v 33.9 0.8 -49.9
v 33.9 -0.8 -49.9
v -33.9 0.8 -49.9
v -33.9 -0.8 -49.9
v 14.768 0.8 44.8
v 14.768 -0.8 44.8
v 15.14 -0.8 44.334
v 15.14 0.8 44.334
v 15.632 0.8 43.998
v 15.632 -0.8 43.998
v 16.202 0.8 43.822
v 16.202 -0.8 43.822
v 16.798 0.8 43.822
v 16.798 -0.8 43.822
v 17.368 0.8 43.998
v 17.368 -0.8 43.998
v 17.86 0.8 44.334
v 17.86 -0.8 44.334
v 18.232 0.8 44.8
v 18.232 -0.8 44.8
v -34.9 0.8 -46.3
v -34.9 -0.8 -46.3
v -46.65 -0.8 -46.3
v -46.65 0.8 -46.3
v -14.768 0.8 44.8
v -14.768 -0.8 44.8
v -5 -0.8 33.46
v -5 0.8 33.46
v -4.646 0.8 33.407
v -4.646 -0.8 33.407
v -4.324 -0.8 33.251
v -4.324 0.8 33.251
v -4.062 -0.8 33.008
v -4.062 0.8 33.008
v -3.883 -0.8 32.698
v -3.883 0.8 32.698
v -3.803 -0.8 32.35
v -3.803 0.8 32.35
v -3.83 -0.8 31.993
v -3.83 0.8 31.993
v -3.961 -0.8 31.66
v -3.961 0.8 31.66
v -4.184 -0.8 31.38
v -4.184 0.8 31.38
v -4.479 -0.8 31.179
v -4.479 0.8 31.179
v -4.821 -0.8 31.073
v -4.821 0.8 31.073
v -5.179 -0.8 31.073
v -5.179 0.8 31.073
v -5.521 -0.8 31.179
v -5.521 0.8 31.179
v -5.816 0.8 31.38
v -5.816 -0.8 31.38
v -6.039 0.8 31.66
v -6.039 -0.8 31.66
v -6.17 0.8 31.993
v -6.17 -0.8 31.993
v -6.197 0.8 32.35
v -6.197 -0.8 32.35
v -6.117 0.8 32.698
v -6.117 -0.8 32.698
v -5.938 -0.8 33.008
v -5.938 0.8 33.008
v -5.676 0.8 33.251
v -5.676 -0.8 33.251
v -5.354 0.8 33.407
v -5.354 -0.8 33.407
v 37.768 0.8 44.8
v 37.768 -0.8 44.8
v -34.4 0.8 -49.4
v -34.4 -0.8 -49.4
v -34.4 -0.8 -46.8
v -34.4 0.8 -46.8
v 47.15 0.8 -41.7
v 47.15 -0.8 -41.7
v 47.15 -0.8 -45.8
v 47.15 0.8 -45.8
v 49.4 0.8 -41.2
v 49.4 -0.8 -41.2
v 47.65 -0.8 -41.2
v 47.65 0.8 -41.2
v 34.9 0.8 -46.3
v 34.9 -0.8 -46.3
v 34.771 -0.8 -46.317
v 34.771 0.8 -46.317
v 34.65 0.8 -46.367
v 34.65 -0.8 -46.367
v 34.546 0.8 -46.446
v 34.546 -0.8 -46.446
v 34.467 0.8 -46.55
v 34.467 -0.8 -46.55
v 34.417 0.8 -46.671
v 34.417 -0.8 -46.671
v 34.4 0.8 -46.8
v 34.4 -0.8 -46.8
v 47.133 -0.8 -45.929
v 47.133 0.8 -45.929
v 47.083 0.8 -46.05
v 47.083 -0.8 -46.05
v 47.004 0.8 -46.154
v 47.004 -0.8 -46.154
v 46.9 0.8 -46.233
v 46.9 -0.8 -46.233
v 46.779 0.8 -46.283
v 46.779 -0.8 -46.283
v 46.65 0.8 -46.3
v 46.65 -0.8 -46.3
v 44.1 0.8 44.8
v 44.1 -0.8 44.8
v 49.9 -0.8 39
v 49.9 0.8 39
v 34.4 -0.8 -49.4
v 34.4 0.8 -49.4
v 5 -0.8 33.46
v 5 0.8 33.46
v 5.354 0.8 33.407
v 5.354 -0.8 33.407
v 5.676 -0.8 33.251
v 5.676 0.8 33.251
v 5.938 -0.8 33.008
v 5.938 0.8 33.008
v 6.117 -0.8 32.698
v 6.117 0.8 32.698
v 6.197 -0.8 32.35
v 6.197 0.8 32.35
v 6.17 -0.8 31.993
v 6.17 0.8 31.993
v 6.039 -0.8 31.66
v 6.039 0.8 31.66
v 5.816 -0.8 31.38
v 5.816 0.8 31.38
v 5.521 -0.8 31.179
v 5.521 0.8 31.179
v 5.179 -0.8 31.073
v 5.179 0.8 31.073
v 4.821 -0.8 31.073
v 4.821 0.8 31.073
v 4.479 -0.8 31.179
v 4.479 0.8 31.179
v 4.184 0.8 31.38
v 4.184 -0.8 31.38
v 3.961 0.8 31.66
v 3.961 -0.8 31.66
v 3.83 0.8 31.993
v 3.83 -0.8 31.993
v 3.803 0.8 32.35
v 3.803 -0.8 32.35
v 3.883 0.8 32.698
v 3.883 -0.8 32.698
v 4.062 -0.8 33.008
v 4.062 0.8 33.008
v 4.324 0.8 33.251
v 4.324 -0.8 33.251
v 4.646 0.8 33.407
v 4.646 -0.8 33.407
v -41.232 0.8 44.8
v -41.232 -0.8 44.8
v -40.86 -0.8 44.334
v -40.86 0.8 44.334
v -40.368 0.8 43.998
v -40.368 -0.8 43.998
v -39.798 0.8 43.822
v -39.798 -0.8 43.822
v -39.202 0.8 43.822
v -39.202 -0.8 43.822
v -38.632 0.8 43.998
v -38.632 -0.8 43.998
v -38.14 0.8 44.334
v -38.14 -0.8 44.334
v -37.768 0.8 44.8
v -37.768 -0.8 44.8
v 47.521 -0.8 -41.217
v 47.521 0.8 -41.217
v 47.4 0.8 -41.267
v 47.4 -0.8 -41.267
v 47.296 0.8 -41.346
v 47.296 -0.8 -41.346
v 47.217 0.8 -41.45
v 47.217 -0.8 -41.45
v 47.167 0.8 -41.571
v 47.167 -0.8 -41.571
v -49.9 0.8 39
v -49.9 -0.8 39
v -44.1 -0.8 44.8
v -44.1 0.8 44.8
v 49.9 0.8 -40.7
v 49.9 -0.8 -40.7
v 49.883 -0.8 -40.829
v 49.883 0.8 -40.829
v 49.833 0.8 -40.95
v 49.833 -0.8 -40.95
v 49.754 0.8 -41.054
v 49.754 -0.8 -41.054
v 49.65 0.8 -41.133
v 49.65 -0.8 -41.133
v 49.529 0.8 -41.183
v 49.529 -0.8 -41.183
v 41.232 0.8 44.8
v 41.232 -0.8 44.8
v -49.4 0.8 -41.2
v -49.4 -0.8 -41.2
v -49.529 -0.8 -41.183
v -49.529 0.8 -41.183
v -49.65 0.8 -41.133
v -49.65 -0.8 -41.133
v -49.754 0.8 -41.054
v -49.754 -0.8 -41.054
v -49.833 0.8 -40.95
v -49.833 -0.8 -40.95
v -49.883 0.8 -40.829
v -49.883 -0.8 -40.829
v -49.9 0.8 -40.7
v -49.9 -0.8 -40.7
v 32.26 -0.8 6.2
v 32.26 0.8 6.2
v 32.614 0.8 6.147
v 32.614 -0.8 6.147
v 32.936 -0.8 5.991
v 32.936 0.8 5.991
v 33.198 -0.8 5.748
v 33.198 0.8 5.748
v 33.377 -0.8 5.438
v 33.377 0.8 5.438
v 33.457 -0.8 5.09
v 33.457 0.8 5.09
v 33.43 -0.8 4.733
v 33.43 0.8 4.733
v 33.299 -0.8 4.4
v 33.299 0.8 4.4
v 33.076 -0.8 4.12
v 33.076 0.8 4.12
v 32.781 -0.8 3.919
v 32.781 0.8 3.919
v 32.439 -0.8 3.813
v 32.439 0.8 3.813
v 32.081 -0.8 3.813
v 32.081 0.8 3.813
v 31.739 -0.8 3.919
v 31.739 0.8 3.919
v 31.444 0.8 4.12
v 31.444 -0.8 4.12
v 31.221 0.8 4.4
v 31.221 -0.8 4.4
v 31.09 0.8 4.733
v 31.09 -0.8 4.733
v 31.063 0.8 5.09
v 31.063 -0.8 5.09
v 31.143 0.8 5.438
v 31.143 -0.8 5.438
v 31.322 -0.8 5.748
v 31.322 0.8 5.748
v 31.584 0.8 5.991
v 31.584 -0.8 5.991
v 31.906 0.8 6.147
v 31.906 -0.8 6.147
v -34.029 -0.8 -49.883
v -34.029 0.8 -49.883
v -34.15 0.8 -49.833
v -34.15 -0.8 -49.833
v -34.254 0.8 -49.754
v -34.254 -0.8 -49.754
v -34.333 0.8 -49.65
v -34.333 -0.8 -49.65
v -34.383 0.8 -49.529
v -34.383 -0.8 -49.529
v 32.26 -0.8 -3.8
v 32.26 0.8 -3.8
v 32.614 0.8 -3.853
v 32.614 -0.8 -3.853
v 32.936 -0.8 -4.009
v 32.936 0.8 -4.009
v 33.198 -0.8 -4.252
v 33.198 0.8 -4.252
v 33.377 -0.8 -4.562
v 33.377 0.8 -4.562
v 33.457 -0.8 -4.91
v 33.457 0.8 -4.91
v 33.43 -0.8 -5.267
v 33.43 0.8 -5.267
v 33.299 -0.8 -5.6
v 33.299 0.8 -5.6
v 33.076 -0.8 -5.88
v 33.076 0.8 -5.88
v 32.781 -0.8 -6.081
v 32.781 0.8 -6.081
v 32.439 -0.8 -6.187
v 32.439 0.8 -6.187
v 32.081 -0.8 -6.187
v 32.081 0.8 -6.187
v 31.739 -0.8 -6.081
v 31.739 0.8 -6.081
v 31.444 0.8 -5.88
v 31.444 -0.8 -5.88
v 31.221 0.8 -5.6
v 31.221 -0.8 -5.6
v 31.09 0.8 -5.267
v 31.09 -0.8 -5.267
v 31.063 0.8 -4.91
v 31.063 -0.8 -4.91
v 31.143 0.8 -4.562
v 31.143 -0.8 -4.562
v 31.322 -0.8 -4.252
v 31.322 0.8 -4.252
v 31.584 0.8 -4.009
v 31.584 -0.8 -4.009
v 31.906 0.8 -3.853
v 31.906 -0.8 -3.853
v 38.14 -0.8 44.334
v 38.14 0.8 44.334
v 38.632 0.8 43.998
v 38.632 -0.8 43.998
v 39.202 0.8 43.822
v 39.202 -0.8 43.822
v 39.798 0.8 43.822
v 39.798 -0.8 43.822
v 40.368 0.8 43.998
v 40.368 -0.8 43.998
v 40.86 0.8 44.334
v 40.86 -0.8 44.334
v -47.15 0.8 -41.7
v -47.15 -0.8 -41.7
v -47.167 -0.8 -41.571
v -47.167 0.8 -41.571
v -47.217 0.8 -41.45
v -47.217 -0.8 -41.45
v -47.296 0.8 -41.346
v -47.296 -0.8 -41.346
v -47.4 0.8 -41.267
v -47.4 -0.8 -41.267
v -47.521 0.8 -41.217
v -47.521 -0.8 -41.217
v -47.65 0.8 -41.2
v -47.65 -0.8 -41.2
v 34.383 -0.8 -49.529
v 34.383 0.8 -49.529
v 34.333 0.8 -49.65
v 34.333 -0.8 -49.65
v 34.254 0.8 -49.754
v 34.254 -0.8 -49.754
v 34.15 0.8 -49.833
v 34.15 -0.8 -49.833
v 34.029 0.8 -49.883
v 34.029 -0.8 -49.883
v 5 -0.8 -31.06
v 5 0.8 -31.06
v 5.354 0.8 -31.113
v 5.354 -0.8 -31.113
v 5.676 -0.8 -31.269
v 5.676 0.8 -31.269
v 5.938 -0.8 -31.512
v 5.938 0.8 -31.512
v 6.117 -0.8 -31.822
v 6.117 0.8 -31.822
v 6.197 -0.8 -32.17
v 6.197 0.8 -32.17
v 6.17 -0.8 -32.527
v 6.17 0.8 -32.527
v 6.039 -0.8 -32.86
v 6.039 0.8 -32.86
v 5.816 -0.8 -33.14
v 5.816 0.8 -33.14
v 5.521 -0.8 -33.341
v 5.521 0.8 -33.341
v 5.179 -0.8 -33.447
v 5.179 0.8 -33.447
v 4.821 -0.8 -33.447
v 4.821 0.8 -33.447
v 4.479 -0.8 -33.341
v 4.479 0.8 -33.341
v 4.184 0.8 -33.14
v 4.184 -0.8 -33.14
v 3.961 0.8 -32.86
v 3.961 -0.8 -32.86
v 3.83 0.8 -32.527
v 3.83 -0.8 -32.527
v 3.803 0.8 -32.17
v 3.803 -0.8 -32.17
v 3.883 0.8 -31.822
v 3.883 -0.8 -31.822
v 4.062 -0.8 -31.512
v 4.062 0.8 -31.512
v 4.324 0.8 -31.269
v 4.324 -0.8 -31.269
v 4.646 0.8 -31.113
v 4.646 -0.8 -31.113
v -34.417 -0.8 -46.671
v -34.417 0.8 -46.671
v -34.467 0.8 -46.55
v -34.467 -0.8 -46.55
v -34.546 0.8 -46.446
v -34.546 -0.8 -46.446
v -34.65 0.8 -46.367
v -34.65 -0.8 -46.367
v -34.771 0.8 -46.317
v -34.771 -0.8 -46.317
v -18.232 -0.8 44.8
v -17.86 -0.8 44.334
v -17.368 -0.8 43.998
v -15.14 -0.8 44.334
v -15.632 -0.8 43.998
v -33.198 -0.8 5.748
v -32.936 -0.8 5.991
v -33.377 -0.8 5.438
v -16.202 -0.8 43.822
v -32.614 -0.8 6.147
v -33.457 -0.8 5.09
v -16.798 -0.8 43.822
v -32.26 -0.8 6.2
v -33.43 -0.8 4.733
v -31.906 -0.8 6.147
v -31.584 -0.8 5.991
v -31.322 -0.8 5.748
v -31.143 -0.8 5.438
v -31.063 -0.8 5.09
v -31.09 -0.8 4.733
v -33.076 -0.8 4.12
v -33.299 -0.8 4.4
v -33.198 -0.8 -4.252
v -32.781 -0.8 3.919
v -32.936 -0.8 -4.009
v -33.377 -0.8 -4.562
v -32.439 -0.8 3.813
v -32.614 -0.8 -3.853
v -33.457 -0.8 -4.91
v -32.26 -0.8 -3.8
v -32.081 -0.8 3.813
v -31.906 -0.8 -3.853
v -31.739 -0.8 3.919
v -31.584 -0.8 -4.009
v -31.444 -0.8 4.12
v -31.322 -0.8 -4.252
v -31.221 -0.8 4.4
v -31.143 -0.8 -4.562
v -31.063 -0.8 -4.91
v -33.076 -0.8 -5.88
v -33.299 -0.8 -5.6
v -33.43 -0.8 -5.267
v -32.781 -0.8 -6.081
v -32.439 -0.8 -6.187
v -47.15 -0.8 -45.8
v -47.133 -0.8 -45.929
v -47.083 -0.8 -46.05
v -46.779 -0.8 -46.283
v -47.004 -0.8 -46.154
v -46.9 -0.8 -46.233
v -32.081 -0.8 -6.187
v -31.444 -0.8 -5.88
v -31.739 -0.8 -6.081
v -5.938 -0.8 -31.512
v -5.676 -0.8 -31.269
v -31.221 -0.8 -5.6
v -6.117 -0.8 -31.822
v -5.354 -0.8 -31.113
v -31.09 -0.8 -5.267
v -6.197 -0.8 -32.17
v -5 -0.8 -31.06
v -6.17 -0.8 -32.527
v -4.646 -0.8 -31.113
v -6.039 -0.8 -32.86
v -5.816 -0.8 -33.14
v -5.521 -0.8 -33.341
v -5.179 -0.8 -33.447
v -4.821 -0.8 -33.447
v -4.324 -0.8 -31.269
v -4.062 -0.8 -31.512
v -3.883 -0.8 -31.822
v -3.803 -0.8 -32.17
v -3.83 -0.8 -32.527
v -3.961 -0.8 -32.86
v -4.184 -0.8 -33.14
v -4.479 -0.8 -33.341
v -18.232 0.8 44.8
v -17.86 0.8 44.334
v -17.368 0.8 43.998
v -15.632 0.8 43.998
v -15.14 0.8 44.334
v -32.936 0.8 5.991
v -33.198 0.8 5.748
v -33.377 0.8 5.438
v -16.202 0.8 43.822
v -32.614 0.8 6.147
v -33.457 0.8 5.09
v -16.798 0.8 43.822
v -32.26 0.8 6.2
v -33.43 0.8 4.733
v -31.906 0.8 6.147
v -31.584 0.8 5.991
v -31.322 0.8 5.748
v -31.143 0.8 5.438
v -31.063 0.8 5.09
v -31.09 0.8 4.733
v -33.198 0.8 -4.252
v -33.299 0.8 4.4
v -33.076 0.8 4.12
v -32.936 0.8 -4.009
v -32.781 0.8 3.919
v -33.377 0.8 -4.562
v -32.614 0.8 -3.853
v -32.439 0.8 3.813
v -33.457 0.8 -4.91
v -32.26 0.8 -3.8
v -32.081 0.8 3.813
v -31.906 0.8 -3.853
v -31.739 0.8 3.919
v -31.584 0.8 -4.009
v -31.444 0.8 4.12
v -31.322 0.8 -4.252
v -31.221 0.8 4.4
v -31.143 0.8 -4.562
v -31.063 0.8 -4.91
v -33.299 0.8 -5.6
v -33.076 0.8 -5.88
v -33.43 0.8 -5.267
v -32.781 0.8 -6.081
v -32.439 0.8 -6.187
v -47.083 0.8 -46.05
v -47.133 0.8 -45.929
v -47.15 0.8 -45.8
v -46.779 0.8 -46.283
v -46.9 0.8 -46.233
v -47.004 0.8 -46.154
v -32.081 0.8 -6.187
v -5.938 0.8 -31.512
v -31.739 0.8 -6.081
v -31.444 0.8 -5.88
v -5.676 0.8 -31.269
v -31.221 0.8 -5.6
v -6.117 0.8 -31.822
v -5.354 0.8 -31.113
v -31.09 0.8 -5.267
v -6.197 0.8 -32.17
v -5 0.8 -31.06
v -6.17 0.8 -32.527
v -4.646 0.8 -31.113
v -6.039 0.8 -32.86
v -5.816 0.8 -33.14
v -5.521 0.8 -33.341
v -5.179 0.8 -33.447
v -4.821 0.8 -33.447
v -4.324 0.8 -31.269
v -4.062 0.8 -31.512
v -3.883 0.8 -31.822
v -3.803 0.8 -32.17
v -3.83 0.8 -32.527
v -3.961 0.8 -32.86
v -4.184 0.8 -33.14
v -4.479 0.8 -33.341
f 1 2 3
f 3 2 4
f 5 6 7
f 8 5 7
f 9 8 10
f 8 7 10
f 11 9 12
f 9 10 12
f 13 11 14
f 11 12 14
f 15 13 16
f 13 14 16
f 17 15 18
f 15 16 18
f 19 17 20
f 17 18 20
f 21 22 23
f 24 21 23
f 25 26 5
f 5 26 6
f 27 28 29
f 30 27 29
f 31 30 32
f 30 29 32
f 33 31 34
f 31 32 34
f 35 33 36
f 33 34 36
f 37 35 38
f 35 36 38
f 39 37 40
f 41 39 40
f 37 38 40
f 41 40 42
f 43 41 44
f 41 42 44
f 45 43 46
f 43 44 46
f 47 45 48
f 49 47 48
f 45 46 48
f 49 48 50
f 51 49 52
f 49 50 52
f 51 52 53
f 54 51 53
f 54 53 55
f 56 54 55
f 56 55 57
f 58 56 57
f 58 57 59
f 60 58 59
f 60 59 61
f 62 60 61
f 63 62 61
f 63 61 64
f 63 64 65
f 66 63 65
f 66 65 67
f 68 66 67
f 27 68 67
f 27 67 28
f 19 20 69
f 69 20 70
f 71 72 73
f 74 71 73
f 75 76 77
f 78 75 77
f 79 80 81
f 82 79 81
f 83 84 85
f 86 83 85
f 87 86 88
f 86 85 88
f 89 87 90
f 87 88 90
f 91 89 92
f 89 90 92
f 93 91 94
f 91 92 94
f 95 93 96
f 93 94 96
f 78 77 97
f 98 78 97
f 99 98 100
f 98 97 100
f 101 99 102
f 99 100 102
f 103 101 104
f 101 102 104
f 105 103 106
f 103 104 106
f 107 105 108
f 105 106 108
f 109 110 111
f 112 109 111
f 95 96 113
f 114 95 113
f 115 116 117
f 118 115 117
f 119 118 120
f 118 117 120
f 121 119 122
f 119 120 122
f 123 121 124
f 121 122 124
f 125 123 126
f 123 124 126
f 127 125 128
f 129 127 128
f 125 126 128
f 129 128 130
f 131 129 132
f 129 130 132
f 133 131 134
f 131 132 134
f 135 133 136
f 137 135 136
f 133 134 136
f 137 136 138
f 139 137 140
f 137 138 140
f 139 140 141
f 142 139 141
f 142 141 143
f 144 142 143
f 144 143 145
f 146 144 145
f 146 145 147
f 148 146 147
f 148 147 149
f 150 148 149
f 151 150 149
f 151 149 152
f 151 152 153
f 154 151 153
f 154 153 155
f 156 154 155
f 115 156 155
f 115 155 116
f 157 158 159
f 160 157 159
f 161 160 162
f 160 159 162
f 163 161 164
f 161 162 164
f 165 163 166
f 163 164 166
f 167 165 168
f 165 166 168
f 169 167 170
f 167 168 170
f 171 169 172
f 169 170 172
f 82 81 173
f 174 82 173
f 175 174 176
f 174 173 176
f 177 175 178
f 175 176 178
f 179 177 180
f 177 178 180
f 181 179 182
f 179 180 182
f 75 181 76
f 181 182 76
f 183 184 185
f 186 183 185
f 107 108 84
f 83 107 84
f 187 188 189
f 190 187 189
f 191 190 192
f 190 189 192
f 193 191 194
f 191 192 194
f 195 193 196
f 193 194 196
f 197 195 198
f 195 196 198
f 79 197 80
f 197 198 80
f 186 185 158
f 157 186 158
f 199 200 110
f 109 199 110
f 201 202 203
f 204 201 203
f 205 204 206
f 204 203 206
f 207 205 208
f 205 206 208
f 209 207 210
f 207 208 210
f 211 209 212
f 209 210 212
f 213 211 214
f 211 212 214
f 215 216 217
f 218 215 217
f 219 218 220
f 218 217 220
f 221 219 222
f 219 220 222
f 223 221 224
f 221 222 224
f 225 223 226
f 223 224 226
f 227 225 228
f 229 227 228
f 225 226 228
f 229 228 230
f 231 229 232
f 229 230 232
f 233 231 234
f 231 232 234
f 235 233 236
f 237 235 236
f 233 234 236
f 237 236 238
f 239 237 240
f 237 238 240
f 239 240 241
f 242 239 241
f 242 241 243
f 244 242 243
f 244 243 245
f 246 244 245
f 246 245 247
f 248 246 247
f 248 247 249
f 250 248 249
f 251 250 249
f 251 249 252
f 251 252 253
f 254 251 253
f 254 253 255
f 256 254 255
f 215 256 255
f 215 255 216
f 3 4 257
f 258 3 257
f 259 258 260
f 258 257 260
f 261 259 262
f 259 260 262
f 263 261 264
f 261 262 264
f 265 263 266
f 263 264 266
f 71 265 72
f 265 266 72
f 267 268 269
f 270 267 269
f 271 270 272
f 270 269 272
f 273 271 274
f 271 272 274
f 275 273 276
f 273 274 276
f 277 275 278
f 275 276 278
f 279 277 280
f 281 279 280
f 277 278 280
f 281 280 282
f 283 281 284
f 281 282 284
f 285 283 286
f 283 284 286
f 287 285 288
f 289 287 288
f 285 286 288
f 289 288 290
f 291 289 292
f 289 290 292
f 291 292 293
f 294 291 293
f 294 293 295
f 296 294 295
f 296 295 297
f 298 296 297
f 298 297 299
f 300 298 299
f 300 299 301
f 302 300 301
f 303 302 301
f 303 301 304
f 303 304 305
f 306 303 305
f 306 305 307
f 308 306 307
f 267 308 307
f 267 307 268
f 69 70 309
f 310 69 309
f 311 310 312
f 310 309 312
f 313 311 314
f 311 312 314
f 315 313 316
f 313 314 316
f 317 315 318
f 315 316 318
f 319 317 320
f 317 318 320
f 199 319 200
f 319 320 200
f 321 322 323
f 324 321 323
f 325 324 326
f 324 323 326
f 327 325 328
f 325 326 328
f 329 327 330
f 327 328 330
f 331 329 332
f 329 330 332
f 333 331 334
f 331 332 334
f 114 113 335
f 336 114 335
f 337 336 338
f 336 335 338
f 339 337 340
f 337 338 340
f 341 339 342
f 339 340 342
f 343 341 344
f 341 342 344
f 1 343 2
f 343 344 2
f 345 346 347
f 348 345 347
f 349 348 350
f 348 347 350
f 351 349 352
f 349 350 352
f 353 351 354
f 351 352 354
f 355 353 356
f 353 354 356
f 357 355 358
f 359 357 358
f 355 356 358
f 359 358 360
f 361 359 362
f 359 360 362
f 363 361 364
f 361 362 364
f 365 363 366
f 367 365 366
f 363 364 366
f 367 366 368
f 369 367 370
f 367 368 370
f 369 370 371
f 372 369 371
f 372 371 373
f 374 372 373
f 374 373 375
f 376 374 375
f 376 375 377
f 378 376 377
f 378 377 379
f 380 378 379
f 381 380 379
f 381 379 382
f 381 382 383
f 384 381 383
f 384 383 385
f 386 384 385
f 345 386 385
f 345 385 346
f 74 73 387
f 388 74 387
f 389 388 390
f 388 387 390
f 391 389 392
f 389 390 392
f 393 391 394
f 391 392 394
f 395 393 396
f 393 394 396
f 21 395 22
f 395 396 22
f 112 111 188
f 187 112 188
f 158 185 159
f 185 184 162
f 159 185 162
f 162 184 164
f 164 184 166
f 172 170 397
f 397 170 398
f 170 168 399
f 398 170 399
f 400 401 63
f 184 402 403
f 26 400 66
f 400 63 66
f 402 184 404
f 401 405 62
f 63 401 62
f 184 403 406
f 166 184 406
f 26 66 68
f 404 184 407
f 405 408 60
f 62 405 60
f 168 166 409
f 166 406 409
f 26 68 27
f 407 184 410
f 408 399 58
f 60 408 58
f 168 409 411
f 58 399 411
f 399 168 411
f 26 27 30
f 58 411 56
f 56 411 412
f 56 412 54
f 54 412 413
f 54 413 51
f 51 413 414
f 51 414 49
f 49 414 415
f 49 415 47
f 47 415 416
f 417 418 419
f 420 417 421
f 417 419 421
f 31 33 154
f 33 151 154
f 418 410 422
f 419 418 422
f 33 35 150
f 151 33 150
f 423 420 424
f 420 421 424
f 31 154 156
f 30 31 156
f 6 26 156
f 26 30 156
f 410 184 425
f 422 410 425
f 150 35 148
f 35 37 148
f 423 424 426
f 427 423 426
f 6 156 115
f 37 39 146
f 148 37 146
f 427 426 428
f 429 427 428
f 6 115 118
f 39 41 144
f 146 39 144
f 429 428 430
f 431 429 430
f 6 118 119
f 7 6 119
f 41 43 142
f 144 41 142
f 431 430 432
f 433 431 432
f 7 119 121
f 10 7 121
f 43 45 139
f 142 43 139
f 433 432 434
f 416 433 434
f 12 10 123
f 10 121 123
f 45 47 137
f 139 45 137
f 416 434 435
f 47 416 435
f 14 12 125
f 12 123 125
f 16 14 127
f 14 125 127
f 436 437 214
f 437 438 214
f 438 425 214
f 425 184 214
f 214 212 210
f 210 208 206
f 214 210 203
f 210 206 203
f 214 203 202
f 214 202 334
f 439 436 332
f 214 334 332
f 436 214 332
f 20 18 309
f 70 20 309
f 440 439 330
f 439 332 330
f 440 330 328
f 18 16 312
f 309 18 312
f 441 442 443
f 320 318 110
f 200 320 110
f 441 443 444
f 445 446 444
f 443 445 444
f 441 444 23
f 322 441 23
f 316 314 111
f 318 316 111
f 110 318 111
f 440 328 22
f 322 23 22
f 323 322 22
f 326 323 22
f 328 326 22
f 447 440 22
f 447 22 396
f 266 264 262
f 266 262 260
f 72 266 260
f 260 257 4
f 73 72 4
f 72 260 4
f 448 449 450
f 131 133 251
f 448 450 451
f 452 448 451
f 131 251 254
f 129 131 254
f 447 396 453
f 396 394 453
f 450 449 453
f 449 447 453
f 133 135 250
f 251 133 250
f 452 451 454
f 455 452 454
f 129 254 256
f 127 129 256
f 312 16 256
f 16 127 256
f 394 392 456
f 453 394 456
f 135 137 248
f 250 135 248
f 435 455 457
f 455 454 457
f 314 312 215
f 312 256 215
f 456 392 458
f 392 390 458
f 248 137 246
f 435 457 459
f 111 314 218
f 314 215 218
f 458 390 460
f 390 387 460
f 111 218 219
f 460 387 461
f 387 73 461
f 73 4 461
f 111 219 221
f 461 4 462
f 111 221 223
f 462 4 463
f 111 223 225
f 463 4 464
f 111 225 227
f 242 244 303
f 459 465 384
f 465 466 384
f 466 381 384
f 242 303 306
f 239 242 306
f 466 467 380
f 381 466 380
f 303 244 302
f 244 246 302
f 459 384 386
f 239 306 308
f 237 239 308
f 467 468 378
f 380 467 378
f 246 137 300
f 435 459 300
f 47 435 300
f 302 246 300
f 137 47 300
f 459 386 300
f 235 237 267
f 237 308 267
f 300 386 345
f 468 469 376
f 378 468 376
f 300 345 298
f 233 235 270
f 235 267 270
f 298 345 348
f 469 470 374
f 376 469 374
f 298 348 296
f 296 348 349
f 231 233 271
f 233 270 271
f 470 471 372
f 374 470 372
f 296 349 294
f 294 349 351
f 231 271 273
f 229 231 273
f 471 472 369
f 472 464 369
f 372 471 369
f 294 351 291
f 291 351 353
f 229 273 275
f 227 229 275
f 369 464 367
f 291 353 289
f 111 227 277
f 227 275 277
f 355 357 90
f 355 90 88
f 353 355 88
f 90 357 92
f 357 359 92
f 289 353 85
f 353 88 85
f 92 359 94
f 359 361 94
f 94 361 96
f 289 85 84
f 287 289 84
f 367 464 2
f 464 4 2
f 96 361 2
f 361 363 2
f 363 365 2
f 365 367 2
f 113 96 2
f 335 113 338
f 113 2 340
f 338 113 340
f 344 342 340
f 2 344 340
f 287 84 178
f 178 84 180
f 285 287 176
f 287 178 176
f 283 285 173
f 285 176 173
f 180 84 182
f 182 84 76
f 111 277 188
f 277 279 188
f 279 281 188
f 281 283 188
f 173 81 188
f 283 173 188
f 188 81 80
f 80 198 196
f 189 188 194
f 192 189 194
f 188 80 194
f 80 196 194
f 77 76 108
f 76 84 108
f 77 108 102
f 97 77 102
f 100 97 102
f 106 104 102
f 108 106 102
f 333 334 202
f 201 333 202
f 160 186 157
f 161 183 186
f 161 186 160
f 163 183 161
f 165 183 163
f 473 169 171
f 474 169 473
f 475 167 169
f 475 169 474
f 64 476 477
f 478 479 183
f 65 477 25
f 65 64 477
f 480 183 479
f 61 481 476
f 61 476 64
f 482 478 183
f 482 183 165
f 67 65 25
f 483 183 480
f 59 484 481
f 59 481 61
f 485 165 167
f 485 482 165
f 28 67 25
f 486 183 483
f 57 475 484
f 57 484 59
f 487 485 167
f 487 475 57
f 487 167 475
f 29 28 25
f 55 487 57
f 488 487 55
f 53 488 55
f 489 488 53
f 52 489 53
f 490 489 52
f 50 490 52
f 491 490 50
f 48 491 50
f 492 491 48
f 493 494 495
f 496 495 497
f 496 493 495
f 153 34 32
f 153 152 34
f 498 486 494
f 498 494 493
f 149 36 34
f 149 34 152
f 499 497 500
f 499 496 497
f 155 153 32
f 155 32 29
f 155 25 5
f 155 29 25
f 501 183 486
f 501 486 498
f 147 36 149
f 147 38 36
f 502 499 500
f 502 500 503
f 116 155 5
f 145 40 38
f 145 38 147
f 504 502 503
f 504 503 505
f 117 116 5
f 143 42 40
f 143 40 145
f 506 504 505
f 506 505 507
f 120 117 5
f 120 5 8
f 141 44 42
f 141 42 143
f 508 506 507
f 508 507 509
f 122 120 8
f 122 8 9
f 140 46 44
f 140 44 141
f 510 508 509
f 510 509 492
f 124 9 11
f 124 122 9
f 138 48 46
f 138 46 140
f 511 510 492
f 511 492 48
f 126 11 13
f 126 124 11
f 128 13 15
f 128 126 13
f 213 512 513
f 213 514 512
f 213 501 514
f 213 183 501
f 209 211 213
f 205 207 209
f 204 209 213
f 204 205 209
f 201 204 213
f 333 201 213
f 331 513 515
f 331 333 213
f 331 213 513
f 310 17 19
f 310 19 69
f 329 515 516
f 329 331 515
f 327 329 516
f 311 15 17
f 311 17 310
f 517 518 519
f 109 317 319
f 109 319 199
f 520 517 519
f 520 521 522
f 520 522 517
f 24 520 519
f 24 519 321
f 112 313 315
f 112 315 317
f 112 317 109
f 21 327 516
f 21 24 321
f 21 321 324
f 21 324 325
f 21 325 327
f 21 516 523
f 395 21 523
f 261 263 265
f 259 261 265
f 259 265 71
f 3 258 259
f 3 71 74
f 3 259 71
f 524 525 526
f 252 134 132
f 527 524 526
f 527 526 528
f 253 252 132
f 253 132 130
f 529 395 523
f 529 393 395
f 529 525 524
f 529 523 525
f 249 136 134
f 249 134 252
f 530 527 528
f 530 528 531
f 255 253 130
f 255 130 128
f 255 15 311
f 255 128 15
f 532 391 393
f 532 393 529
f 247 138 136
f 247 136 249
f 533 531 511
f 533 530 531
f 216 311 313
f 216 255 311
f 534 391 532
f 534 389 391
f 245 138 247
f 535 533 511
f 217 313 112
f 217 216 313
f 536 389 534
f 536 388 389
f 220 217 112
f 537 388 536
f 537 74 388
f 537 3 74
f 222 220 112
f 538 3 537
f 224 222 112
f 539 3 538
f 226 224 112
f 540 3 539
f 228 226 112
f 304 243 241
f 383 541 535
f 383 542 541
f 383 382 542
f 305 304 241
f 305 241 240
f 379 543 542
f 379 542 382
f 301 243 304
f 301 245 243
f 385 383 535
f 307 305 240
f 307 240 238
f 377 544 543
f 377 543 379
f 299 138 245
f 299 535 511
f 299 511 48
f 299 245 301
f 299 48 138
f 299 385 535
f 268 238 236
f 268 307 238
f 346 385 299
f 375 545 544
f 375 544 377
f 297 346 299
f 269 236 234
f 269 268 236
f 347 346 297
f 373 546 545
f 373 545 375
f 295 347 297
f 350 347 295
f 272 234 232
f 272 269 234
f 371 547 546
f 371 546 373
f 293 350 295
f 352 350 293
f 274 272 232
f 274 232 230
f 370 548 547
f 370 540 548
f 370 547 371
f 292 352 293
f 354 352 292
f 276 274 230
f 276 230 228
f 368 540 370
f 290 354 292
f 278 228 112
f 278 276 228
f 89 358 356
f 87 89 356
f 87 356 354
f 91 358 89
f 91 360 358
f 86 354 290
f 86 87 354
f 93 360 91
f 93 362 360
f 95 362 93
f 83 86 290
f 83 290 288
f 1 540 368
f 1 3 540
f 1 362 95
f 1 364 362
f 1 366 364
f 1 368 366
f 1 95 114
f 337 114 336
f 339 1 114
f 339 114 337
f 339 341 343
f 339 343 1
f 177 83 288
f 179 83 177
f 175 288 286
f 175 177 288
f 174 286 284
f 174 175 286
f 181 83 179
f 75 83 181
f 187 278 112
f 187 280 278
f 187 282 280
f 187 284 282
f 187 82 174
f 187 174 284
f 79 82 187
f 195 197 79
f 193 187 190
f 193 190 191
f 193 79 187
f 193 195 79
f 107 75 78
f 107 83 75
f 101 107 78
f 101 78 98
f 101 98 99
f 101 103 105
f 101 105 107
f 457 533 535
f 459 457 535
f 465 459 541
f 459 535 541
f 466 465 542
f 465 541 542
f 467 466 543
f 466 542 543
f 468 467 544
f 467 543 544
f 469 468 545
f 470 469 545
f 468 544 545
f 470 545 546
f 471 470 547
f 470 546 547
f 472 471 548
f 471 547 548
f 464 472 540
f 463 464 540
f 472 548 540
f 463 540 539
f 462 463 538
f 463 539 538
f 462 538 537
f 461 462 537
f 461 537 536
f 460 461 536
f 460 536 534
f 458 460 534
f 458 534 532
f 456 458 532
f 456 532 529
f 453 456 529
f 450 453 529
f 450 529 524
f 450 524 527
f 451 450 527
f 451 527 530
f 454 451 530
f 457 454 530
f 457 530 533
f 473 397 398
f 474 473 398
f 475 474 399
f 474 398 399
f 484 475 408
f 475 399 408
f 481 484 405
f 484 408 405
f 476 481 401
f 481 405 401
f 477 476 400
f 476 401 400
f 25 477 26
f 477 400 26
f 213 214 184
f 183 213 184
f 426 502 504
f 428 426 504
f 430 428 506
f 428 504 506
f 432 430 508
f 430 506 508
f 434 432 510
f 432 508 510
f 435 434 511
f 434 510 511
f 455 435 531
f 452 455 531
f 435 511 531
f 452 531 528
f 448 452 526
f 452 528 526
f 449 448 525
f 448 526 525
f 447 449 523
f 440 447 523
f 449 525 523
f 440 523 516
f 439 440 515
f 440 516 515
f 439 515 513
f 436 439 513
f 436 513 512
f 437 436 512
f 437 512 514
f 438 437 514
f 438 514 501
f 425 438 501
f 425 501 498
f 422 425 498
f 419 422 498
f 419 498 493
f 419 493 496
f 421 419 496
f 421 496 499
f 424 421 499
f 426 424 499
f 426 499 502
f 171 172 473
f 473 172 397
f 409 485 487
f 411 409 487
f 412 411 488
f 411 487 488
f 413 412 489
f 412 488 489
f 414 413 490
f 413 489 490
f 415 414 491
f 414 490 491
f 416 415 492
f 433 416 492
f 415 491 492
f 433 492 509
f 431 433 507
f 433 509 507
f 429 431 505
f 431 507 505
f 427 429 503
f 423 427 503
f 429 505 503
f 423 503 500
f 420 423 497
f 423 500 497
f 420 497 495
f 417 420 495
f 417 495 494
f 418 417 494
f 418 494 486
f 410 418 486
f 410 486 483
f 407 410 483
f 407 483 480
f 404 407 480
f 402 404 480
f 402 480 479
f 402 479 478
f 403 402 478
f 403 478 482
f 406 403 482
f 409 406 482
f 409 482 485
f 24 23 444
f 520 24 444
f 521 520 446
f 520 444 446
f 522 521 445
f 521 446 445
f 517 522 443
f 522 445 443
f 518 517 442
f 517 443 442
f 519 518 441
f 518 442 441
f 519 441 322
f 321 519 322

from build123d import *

# Parameters (mm, degrees)
GENERICCARDPCBDEFINITION_START = -0.8
GENERICCARDPCBDEFINITION_DEPTH = 1.6
CUT_EXTRUDE1_REACH             = 72.587
SKETCH1_R                      = 1.2


# Read off the part's stored shape, not the designer's step: GenericCardPCBDefinition
with BuildPart() as part:
    # GenericCardPCBDefinition outline → GenericCardPCBDefinition (new body)
    with BuildSketch(Plane(origin=(0, 0, 0), x_dir=(1, 0, 0), z_dir=(0, 1, 0)).offset(GENERICCARDPCBDEFINITION_START)):
        with BuildLine():
            Line((-49.9, -39), (-44.1, -44.8))
            Line((-44.1, -44.8), (-41.232050808, -44.8))
            ThreePointArc((-41.232050808, -44.8), (-39.5, -43.8), (-37.767949192, -44.8))
            Line((-37.767949192, -44.8), (-18.232050808, -44.8))
            ThreePointArc((-18.232050808, -44.8), (-16.5, -43.8), (-14.767949192, -44.8))
            Line((-14.767949192, -44.8), (14.767949192, -44.8))
            ThreePointArc((14.767949192, -44.8), (16.5, -43.8), (18.232050808, -44.8))
            Line((18.232050808, -44.8), (37.767949192, -44.8))
            ThreePointArc((37.767949192, -44.8), (39.5, -43.8), (41.232050808, -44.8))
            Line((41.232050808, -44.8), (44.1, -44.8))
            Line((44.1, -44.8), (49.9, -39))
            Line((49.9, -39), (49.9, 40.7))
            ThreePointArc((49.9, 40.7), (49.753553391, 41.053553391), (49.4, 41.2))
            Line((49.4, 41.2), (47.65, 41.2))
            ThreePointArc((47.65, 41.2), (47.296446609, 41.346446609), (47.15, 41.7))
            Line((47.15, 41.7), (47.15, 45.8))
            ThreePointArc((47.15, 45.8), (47.003553391, 46.153553391), (46.65, 46.3))
            Line((46.65, 46.3), (34.9, 46.3))
            ThreePointArc((34.9, 46.3), (34.546446609, 46.446446609), (34.4, 46.8))
            Line((34.4, 46.8), (34.4, 49.4))
            ThreePointArc((34.4, 49.4), (34.253553391, 49.753553391), (33.9, 49.9))
            Line((33.9, 49.9), (-33.9, 49.9))
            ThreePointArc((-33.9, 49.9), (-34.253553391, 49.753553391), (-34.4, 49.4))
            Line((-34.4, 49.4), (-34.4, 46.8))
            ThreePointArc((-34.4, 46.8), (-34.546446609, 46.446446609), (-34.9, 46.3))
            Line((-34.9, 46.3), (-46.65, 46.3))
            ThreePointArc((-46.65, 46.3), (-47.003553391, 46.153553391), (-47.15, 45.8))
            Line((-47.15, 45.8), (-47.15, 41.7))
            ThreePointArc((-47.15, 41.7), (-47.296446609, 41.346446609), (-47.65, 41.2))
            Line((-47.65, 41.2), (-49.4, 41.2))
            ThreePointArc((-49.4, 41.2), (-49.753553391, 41.053553391), (-49.9, 40.7))
            Line((-49.9, 40.7), (-49.9, -39))
        make_face()
    extrude(amount=GENERICCARDPCBDEFINITION_DEPTH)

    # Sketch1 → Cut-Extrude1 (cut, up to next)
    with BuildSketch(Plane(origin=(0, 0.8, 0), x_dir=(1, 0, 0), z_dir=(0, 1, 0)), mode=Mode.PRIVATE) as cut_extrude1_sk1:
        with Locations(Location((32.26, 5, 0), (0, 0, 270))):
            Circle(SKETCH1_R)
    cut_extrude1_tool1 = extrude(cut_extrude1_sk1.sketch, amount=-CUT_EXTRUDE1_REACH, mode=Mode.PRIVATE) & part.part
    # Sketch1 → Cut-Extrude1 (cut, up to next)
    with BuildSketch(Plane(origin=(0, 0.8, 0), x_dir=(1, 0, 0), z_dir=(0, 1, 0)), mode=Mode.PRIVATE) as cut_extrude1_sk2:
        with Locations(Location((32.26, -5, 0), (0, 0, 270))):
            Circle(SKETCH1_R)
    cut_extrude1_tool2 = extrude(cut_extrude1_sk2.sketch, amount=-CUT_EXTRUDE1_REACH, mode=Mode.PRIVATE) & part.part
    # Sketch1 → Cut-Extrude1 (cut, up to next)
    with BuildSketch(Plane(origin=(0, 0.8, 0), x_dir=(1, 0, 0), z_dir=(0, 1, 0)), mode=Mode.PRIVATE) as cut_extrude1_sk3:
        with Locations(Location((-32.26, 5, 0), (0, 0, 270))):
            Circle(SKETCH1_R)
    cut_extrude1_tool3 = extrude(cut_extrude1_sk3.sketch, amount=-CUT_EXTRUDE1_REACH, mode=Mode.PRIVATE) & part.part
    # Sketch1 → Cut-Extrude1 (cut, up to next)
    with BuildSketch(Plane(origin=(0, 0.8, 0), x_dir=(1, 0, 0), z_dir=(0, 1, 0)), mode=Mode.PRIVATE) as cut_extrude1_sk4:
        with Locations(Location((-32.26, -5, 0), (0, 0, 270))):
            Circle(SKETCH1_R)
    cut_extrude1_tool4 = extrude(cut_extrude1_sk4.sketch, amount=-CUT_EXTRUDE1_REACH, mode=Mode.PRIVATE) & part.part
    # Sketch1 → Cut-Extrude1 (cut, up to next)
    with BuildSketch(Plane(origin=(0, 0.8, 0), x_dir=(1, 0, 0), z_dir=(0, 1, 0)), mode=Mode.PRIVATE) as cut_extrude1_sk5:
        with Locations(Location((-5, -32.26, 0), (0, 0, 270))):
            Circle(SKETCH1_R)
    cut_extrude1_tool5 = extrude(cut_extrude1_sk5.sketch, amount=-CUT_EXTRUDE1_REACH, mode=Mode.PRIVATE) & part.part
    # Sketch1 → Cut-Extrude1 (cut, up to next)
    with BuildSketch(Plane(origin=(0, 0.8, 0), x_dir=(1, 0, 0), z_dir=(0, 1, 0)), mode=Mode.PRIVATE) as cut_extrude1_sk6:
        with Locations(Location((5, -32.26, 0), (0, 0, 270))):
            Circle(SKETCH1_R)
    cut_extrude1_tool6 = extrude(cut_extrude1_sk6.sketch, amount=-CUT_EXTRUDE1_REACH, mode=Mode.PRIVATE) & part.part
    # Sketch1 → Cut-Extrude1 (cut, up to next)
    with BuildSketch(Plane(origin=(0, 0.8, 0), x_dir=(1, 0, 0), z_dir=(0, 1, 0)), mode=Mode.PRIVATE) as cut_extrude1_sk7:
        with Locations(Location((-5, 32.26, 0), (0, 0, 270))):
            Circle(SKETCH1_R)
    cut_extrude1_tool7 = extrude(cut_extrude1_sk7.sketch, amount=-CUT_EXTRUDE1_REACH, mode=Mode.PRIVATE) & part.part
    # Sketch1 → Cut-Extrude1 (cut, up to next)
    with BuildSketch(Plane(origin=(0, 0.8, 0), x_dir=(1, 0, 0), z_dir=(0, 1, 0)), mode=Mode.PRIVATE) as cut_extrude1_sk8:
        with Locations(Location((5, 32.26, 0), (0, 0, 270))):
            Circle(SKETCH1_R)
    cut_extrude1_tool8 = extrude(cut_extrude1_sk8.sketch, amount=-CUT_EXTRUDE1_REACH, mode=Mode.PRIVATE) & part.part
    add(cut_extrude1_tool1.solids().sort_by_distance((32.26, 0.8, -5))[0], mode=Mode.SUBTRACT)
    add(cut_extrude1_tool2.solids().sort_by_distance((32.26, 0.8, 5))[0], mode=Mode.SUBTRACT)
    add(cut_extrude1_tool3.solids().sort_by_distance((-32.26, 0.8, -5))[0], mode=Mode.SUBTRACT)
    add(cut_extrude1_tool4.solids().sort_by_distance((-32.26, 0.8, 5))[0], mode=Mode.SUBTRACT)
    add(cut_extrude1_tool5.solids().sort_by_distance((-5, 0.8, 32.26))[0], mode=Mode.SUBTRACT)
    add(cut_extrude1_tool6.solids().sort_by_distance((5, 0.8, 32.26))[0], mode=Mode.SUBTRACT)
    add(cut_extrude1_tool7.solids().sort_by_distance((-5, 0.8, -32.26))[0], mode=Mode.SUBTRACT)
    add(cut_extrude1_tool8.solids().sort_by_distance((5, 0.8, -32.26))[0], mode=Mode.SUBTRACT)


solid = part.part
